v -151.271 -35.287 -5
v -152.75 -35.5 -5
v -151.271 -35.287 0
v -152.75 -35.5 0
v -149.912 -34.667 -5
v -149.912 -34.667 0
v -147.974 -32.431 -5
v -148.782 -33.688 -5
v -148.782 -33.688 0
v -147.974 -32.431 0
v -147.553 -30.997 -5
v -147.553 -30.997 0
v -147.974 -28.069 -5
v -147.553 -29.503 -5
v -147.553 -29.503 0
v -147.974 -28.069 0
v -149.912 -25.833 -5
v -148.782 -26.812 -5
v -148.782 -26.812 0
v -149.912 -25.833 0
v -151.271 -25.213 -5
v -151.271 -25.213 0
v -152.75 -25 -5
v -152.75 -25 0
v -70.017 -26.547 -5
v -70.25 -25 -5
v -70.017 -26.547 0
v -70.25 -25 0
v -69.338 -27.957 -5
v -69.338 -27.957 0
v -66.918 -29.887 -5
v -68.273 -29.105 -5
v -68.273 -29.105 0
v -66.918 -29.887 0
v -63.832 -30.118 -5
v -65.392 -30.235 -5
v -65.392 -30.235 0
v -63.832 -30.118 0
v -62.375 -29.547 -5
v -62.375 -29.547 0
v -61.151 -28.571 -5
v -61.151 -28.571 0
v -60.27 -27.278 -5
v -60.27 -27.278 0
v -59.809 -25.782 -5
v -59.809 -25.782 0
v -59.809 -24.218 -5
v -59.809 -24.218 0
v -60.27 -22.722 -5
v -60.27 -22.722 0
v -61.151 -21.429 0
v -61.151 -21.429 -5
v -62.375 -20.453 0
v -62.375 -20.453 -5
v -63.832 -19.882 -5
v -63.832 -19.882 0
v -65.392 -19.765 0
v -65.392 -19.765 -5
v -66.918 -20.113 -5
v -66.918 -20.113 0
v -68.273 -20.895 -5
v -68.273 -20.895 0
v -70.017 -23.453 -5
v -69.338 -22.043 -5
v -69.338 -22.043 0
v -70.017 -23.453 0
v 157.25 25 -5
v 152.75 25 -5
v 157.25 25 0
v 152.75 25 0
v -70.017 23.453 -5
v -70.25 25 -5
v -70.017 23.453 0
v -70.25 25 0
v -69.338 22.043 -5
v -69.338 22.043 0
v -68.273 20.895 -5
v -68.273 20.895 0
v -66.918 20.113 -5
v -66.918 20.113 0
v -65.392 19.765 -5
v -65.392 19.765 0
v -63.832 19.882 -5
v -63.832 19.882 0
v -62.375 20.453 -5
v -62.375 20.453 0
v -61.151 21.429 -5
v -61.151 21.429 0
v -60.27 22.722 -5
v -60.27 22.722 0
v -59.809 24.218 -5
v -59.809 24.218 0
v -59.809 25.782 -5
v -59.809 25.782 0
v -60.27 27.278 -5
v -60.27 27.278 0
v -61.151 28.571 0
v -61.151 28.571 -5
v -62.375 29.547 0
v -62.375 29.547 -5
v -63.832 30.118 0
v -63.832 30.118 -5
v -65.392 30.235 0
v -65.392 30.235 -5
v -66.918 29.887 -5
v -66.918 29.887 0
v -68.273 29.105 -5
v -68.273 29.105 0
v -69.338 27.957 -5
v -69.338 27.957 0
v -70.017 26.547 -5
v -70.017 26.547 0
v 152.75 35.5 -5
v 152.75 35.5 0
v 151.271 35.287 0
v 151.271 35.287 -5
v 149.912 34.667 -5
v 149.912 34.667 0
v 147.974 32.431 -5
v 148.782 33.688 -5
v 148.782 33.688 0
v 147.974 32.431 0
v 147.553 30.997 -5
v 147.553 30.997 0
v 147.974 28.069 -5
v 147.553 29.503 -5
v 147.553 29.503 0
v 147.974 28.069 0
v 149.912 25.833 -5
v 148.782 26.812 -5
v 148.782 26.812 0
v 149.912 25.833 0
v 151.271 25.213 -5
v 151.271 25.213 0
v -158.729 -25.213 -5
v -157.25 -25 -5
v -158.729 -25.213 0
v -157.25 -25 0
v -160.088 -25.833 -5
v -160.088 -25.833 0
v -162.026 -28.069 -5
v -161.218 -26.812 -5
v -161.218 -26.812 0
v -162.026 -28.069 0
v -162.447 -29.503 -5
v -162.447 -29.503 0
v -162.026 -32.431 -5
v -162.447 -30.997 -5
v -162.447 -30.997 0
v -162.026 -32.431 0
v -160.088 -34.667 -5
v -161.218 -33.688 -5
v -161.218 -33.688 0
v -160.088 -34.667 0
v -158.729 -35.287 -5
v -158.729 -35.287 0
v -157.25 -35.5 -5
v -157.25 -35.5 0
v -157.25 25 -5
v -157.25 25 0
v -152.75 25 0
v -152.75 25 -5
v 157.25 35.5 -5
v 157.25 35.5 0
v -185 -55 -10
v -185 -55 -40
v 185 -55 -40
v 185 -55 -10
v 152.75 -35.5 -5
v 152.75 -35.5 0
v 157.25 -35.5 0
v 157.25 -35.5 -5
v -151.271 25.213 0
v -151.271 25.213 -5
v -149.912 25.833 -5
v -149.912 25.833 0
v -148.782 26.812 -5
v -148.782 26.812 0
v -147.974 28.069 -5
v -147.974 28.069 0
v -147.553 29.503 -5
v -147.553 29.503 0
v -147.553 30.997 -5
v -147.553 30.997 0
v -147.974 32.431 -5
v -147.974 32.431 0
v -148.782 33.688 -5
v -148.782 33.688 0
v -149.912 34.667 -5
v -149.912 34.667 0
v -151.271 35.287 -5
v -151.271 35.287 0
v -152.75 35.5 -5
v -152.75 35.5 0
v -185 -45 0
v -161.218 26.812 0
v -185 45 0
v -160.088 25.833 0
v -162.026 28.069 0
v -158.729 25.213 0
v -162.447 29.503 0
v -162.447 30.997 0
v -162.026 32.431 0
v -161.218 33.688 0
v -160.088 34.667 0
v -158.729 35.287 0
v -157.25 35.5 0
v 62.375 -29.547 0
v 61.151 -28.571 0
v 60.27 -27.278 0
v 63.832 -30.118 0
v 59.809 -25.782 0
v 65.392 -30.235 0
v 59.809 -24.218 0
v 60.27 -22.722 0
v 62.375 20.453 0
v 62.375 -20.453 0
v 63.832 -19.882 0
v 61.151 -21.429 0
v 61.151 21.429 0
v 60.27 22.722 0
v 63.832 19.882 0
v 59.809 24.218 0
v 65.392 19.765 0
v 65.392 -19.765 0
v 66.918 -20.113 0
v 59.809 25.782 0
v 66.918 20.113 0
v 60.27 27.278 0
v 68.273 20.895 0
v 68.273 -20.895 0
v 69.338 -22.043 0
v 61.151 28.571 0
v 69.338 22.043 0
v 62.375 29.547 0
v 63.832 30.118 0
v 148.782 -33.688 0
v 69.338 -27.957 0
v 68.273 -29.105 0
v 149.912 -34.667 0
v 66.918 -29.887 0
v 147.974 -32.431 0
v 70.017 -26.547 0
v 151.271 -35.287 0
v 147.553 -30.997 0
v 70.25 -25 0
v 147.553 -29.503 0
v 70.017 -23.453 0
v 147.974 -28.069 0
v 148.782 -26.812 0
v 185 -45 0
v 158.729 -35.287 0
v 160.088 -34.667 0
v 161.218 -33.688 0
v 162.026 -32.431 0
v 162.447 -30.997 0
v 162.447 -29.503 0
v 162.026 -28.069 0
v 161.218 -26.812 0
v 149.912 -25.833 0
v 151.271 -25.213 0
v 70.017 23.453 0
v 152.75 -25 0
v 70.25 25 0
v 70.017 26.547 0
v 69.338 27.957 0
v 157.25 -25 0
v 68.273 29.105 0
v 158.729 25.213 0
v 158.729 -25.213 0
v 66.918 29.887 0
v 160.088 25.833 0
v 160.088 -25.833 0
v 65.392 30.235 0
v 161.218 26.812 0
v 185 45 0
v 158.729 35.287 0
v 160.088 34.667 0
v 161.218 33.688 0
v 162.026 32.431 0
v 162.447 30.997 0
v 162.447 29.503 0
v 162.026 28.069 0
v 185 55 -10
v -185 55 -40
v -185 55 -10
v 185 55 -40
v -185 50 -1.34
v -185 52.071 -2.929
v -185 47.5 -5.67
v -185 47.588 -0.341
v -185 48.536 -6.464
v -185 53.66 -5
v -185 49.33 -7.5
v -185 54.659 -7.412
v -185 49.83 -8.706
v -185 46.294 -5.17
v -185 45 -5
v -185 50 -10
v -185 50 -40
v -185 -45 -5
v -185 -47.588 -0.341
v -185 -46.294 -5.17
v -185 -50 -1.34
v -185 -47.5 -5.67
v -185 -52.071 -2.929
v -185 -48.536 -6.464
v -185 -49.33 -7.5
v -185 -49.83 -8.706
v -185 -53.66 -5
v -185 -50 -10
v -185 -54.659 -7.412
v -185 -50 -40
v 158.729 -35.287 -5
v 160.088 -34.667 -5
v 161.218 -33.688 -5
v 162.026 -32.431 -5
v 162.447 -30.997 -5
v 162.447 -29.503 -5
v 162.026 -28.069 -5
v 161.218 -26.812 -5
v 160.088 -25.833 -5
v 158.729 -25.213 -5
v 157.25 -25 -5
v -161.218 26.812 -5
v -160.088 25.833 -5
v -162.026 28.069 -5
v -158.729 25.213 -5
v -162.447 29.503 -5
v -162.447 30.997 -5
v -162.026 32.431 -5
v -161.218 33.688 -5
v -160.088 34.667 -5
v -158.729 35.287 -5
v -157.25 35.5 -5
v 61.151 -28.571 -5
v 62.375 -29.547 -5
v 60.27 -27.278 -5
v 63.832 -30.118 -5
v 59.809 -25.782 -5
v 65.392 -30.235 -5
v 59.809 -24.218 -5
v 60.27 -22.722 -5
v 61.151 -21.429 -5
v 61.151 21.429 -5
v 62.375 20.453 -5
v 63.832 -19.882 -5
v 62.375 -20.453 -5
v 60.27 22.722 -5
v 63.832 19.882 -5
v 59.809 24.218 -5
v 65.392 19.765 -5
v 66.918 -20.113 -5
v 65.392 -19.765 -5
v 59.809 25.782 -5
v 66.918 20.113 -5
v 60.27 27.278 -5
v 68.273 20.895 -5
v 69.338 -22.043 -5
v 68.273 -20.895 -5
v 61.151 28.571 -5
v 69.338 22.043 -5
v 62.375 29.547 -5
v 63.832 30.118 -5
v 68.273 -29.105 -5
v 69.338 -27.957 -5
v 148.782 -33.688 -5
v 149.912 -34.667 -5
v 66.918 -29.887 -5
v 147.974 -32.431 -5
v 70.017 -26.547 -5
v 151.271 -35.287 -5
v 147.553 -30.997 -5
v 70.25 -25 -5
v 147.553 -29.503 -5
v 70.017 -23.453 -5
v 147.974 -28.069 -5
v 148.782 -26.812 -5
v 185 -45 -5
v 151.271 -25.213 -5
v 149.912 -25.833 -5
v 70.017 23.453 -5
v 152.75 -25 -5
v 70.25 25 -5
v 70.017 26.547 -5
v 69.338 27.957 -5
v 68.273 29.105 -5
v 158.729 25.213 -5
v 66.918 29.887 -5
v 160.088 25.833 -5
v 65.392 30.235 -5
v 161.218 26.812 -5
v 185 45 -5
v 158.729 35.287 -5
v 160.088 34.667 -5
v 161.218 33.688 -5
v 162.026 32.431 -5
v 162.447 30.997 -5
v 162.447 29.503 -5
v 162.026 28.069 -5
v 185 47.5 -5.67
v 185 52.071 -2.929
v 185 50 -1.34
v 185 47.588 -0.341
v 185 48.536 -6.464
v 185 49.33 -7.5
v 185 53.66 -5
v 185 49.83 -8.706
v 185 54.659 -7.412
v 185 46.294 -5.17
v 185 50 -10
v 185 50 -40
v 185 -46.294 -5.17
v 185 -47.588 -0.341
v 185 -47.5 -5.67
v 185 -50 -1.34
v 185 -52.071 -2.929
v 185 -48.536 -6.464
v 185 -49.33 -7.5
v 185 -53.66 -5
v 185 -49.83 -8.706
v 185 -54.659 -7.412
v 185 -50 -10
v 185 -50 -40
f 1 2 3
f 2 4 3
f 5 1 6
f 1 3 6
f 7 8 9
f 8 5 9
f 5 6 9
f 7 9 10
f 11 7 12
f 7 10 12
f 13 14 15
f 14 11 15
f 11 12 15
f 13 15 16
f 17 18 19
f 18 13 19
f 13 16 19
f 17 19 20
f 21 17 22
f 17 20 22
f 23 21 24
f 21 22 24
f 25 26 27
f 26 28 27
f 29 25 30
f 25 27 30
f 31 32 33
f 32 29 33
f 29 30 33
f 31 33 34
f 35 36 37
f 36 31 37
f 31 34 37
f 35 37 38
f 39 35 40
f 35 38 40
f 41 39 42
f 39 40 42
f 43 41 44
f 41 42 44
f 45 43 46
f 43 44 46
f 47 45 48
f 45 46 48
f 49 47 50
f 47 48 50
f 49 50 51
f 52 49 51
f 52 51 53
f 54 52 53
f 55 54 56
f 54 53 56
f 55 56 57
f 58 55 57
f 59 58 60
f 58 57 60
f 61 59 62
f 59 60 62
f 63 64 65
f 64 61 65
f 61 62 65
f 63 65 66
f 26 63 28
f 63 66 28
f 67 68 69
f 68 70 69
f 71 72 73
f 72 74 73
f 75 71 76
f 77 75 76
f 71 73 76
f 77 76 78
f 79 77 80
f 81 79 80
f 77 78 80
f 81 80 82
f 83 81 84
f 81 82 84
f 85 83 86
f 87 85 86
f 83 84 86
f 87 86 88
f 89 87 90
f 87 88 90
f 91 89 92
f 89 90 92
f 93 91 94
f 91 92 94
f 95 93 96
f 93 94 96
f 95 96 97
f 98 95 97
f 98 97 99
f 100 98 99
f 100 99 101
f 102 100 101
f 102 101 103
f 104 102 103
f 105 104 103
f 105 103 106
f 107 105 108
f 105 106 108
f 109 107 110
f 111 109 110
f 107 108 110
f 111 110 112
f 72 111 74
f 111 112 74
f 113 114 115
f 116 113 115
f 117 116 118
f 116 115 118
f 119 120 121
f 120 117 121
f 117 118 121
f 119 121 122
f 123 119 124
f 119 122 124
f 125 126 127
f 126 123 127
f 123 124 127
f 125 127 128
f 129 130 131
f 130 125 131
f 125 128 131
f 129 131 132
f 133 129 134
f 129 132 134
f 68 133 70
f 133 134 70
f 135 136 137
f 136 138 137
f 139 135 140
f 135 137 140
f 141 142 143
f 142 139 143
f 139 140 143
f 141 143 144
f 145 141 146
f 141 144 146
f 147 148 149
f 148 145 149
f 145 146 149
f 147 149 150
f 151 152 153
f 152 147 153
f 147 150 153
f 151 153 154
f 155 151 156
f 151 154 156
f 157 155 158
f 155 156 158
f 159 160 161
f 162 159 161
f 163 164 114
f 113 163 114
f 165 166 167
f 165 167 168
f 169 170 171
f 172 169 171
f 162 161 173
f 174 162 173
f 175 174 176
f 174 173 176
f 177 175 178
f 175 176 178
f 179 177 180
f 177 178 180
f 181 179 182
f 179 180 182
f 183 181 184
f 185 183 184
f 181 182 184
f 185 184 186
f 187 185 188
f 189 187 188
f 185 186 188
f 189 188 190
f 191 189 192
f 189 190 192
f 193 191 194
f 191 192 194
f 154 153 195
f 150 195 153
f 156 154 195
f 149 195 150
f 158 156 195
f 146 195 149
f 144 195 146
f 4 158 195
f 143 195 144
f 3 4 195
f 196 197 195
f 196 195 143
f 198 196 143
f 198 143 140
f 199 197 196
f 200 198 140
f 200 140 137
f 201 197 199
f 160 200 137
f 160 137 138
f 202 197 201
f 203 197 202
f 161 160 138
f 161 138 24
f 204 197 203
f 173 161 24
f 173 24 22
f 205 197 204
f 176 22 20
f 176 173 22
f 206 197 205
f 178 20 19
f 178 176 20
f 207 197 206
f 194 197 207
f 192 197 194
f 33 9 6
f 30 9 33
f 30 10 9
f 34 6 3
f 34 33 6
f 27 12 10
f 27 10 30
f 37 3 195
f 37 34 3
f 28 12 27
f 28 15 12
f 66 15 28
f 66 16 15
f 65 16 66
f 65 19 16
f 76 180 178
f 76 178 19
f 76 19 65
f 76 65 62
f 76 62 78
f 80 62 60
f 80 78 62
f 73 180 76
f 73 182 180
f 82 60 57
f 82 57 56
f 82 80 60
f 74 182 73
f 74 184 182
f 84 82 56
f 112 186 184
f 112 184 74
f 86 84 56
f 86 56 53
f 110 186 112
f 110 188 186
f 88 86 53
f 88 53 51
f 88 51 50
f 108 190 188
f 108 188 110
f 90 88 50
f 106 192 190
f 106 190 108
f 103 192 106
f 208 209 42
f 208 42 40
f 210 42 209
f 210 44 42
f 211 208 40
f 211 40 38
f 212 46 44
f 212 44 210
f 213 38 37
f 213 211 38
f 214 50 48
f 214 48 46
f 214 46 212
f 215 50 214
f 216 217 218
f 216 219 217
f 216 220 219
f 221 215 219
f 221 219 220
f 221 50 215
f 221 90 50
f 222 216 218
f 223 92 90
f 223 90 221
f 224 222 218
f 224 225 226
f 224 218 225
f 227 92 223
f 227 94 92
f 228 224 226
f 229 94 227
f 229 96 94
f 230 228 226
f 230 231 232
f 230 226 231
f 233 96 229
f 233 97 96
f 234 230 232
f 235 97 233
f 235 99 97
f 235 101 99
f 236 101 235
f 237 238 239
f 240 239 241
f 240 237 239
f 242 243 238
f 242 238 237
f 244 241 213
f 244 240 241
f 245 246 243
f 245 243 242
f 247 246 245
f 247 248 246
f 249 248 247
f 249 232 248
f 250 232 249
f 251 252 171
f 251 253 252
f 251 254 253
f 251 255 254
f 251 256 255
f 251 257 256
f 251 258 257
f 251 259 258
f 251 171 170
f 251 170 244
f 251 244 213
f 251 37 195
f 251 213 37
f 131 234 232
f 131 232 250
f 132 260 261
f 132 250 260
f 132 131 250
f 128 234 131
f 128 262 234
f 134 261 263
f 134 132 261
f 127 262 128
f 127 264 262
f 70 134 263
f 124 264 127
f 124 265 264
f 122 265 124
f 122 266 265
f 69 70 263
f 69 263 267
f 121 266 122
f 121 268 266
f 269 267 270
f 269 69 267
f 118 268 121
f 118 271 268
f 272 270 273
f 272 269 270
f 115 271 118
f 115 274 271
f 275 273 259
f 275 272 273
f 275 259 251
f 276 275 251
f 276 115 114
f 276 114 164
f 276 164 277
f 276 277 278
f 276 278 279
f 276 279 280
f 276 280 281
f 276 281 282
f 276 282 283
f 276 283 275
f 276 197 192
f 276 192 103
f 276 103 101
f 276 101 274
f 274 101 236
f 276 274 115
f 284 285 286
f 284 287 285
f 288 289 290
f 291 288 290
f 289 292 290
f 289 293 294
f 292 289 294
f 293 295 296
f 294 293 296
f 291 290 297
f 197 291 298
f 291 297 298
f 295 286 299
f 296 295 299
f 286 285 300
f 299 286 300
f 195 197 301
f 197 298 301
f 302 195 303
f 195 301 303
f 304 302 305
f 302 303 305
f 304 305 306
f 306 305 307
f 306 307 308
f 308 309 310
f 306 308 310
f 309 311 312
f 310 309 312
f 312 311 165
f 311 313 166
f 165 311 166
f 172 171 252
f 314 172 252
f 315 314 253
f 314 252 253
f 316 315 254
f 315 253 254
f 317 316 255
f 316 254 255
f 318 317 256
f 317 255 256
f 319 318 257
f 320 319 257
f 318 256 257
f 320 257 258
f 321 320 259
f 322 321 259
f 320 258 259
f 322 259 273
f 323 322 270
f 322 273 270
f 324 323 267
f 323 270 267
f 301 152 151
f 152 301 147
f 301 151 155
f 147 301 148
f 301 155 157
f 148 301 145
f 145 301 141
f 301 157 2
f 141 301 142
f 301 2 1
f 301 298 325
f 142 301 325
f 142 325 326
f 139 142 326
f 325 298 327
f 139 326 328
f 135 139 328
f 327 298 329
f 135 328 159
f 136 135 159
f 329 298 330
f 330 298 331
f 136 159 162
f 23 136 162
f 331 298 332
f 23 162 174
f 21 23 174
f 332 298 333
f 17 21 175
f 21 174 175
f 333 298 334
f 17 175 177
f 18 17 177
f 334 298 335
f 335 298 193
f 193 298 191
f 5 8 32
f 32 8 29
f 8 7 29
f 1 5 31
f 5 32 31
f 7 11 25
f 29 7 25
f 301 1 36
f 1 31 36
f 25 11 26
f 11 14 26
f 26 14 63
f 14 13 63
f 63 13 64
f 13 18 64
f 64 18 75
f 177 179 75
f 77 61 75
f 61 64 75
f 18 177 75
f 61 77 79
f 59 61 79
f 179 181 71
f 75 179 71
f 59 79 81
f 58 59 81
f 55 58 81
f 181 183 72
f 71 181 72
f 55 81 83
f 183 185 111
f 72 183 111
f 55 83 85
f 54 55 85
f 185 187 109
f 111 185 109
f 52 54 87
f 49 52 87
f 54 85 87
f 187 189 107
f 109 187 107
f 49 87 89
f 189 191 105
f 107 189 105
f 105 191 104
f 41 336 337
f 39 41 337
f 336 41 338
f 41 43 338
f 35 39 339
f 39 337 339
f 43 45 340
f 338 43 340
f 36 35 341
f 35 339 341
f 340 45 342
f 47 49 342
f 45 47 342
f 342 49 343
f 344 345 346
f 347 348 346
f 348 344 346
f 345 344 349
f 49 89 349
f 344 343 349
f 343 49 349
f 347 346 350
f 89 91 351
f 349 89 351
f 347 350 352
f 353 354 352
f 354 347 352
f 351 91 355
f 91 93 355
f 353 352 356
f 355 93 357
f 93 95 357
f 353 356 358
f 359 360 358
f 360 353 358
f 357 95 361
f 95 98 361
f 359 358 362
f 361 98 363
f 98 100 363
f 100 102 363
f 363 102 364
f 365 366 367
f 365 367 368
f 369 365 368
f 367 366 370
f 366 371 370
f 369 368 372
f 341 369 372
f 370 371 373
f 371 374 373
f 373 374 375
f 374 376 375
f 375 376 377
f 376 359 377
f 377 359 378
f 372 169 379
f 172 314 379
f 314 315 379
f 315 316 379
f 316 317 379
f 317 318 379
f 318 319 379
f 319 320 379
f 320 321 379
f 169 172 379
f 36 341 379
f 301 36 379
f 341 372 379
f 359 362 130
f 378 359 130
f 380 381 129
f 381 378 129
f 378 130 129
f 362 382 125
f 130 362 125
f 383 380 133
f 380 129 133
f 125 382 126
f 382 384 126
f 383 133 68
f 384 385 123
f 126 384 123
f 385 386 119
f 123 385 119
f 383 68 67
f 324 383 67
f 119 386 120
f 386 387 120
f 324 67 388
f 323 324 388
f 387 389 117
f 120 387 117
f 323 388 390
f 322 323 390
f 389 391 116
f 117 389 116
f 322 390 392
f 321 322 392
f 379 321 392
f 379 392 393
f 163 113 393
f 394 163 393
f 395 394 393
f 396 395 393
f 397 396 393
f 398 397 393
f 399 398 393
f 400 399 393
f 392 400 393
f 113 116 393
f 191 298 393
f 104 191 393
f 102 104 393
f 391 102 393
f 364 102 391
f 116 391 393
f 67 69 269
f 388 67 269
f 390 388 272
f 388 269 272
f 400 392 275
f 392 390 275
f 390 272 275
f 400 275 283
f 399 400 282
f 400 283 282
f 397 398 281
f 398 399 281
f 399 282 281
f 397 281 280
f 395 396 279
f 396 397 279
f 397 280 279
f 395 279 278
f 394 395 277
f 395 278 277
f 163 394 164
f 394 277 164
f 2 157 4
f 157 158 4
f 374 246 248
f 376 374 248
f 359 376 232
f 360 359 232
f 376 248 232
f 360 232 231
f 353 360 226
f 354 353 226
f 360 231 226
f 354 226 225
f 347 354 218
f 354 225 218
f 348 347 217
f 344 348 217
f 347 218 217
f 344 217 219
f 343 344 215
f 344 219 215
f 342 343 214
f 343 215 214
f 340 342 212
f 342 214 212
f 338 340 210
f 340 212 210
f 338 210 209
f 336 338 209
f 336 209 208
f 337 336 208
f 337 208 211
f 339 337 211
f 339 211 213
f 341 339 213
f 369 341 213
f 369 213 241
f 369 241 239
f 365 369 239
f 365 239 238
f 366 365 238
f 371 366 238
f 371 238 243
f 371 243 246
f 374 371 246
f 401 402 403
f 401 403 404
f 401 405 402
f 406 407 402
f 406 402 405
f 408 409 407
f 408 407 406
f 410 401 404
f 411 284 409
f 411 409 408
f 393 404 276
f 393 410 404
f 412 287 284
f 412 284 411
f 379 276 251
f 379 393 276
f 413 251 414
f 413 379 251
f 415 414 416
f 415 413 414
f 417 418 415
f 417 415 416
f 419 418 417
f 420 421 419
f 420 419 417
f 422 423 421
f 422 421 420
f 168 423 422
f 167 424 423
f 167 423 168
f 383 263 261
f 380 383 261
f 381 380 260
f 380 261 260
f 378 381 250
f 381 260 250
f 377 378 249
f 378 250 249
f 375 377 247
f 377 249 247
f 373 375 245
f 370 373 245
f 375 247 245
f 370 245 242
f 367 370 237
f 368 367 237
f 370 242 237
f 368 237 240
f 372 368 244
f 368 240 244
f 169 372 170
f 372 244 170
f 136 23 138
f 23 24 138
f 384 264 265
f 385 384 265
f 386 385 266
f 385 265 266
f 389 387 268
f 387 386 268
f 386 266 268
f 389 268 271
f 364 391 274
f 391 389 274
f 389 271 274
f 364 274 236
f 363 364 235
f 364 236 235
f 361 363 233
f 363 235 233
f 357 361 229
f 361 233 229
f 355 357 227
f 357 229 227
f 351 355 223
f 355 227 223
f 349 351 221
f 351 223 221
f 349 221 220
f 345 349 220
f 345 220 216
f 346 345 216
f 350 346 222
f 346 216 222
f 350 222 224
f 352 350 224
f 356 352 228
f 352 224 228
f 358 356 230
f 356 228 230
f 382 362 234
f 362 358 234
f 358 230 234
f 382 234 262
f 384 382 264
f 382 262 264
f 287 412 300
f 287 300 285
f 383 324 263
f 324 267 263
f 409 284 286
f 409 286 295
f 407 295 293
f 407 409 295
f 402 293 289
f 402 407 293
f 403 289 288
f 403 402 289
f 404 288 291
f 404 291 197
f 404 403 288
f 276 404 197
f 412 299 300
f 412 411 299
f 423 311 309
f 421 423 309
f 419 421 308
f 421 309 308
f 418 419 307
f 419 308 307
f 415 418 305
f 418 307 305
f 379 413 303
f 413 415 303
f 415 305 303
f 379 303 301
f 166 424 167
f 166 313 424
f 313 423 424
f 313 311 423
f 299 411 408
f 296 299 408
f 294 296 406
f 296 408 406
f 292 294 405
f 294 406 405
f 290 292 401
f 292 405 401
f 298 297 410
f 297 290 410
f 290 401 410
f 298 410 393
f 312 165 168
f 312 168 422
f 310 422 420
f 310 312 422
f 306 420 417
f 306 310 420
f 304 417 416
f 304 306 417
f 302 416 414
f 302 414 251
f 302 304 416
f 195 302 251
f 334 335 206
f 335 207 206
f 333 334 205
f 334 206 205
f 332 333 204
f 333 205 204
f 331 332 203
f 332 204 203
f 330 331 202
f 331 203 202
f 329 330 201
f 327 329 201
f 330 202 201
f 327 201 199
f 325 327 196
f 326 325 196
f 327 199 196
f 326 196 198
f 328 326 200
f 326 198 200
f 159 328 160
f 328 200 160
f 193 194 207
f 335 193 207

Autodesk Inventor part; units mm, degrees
ref_plane "YZ Plane" through (0, 0, 0) normal (1, 0, 0) x (0, 1, 0)
ref_plane "XZ Plane" through (0, 0, 0) normal (0, 1, 0) x (-1, 0, 0)
ref_plane "XY Plane" through (0, 0, 0) normal (0, 0, 1) x (1, 0, 0)
sketch "Sketch1" plane through (0, 0, 0) normal (0, 0, 1) x (1, 0, 0)
  line L0 (185, -55) -> (-185, -55)
  line L1 (185, 55) -> (-185, 55)
  circle A0 centre (65, -25) radius 5.25
  line L2 (185, 55) -> (185, -55)
  line L3 (-185, 55) -> (-185, -55)
  line L4 (185, 55) -> (-185, -55) construction
  line L5 (185, -55) -> (-185, 55) construction
  line L6 (65, 25) -> (65, -25) construction
  line L7 (152.75, -30.25) -> (157.25, -30.25) construction
  line L8 (152.75, -35.5) -> (157.25, -35.5)
  line L9 (157.25, -25) -> (152.75, -25)
  arc A1 (152.75, -25) -> (152.75, -35.5) centre (152.75, -30.25) ccw
  arc A2 (157.25, -35.5) -> (157.25, -25) centre (157.25, -30.25) ccw
  line L10 (0, 0) -> (155, 0) construction
  line L11 (155, 0) -> (155, -30.25) construction
  dimension "d25" = 50
  dimension "d57" = 2.25
  dimension "d58" = 10.5
  dimension "d59" = 30.25
  dimension "d60" = 155
  dimension "d61" = 110
  dimension "d62" = 370
  dimension "d73" = 65
extrude "Plate1" add sketch "Sketch1" against normal blind 5 contours L0 L3 L1 L2 | A0 | A1 L9 A2 L8
sketch "Sketch4" plane through (185, 50, 0) normal (0, 1, 0) x (-1, 0, 0)
  line L0 (370, 0) -> (0, 0)
  line L1 (0, 0) -> (0, -40)
  line L2 (0, -40) -> (370, -40)
  line L3 (370, -40) -> (370, 0)
edge flange "Flange1" height 40 angle 90 thickness 5 bend radius 5 thickness toward (0, 1, 0) relief tear relief width 5 relief depth 2.5 corner gap 5 corner form 0 edges at (0, 55, -5) (0, -55, -5) wall of the first edge with corners at (-185, 50, 0) (185, 50, 0) (185, 50, -40) (-185, 50, -40)
bend "Bend3"
corner "Corner3"
extrude "Cut1" cut sketch "Sketch1" against normal blind 5 contours A1 L9 A2 L8
extrude "Cut2" cut sketch "Sketch1" against normal blind 5 contours A0
mirror "Mirror1" about plane through (0, 0, 0) normal (0, 1, 0) of "Cut2", "Cut1"
mirror "Mirror2" about plane through (0, 0, 0) normal (1, 0, 0) of "Cut2", "Cut1", "Mirror1"
equation "\"d74\" = Thickness"
equation "\"d76\" = Thickness"
equation "\"d78\" = Thickness"
equation "\"d63\" = BendReliefWidth"
equation "\"d64\" = BendReliefDepth"
equation "\"d65\" = MinimumRemnant"
equation "\"d66\" = BendRadius"
equation "\"d69\" = BendRadius"
equation "\"d70\" = CornerReliefSize"
equation "\"d71\" = GapSize"
equation "\"d72\" = JacobiRadiusSize"
equation "\"BendRadius\" = Thickness"
equation "\"BendReliefWidth\" = Thickness"
equation "\"BendReliefDepth\" = 0.5 * Thickness"
equation "\"TransitionRadius\" = BendRadius"
equation "\"JacobiRadiusSize\" = Thickness"
equation "\"d36\" = BendRadius"
equation "\"GapSize\" = Thickness"
equation "\"Thickness\" = 5"
equation "\"MinimumRemnant\" = 10"
equation "\"CornerReliefSize\" = 20"
properties part number "ADSK-MH-10032" material "Steel, Mild"
